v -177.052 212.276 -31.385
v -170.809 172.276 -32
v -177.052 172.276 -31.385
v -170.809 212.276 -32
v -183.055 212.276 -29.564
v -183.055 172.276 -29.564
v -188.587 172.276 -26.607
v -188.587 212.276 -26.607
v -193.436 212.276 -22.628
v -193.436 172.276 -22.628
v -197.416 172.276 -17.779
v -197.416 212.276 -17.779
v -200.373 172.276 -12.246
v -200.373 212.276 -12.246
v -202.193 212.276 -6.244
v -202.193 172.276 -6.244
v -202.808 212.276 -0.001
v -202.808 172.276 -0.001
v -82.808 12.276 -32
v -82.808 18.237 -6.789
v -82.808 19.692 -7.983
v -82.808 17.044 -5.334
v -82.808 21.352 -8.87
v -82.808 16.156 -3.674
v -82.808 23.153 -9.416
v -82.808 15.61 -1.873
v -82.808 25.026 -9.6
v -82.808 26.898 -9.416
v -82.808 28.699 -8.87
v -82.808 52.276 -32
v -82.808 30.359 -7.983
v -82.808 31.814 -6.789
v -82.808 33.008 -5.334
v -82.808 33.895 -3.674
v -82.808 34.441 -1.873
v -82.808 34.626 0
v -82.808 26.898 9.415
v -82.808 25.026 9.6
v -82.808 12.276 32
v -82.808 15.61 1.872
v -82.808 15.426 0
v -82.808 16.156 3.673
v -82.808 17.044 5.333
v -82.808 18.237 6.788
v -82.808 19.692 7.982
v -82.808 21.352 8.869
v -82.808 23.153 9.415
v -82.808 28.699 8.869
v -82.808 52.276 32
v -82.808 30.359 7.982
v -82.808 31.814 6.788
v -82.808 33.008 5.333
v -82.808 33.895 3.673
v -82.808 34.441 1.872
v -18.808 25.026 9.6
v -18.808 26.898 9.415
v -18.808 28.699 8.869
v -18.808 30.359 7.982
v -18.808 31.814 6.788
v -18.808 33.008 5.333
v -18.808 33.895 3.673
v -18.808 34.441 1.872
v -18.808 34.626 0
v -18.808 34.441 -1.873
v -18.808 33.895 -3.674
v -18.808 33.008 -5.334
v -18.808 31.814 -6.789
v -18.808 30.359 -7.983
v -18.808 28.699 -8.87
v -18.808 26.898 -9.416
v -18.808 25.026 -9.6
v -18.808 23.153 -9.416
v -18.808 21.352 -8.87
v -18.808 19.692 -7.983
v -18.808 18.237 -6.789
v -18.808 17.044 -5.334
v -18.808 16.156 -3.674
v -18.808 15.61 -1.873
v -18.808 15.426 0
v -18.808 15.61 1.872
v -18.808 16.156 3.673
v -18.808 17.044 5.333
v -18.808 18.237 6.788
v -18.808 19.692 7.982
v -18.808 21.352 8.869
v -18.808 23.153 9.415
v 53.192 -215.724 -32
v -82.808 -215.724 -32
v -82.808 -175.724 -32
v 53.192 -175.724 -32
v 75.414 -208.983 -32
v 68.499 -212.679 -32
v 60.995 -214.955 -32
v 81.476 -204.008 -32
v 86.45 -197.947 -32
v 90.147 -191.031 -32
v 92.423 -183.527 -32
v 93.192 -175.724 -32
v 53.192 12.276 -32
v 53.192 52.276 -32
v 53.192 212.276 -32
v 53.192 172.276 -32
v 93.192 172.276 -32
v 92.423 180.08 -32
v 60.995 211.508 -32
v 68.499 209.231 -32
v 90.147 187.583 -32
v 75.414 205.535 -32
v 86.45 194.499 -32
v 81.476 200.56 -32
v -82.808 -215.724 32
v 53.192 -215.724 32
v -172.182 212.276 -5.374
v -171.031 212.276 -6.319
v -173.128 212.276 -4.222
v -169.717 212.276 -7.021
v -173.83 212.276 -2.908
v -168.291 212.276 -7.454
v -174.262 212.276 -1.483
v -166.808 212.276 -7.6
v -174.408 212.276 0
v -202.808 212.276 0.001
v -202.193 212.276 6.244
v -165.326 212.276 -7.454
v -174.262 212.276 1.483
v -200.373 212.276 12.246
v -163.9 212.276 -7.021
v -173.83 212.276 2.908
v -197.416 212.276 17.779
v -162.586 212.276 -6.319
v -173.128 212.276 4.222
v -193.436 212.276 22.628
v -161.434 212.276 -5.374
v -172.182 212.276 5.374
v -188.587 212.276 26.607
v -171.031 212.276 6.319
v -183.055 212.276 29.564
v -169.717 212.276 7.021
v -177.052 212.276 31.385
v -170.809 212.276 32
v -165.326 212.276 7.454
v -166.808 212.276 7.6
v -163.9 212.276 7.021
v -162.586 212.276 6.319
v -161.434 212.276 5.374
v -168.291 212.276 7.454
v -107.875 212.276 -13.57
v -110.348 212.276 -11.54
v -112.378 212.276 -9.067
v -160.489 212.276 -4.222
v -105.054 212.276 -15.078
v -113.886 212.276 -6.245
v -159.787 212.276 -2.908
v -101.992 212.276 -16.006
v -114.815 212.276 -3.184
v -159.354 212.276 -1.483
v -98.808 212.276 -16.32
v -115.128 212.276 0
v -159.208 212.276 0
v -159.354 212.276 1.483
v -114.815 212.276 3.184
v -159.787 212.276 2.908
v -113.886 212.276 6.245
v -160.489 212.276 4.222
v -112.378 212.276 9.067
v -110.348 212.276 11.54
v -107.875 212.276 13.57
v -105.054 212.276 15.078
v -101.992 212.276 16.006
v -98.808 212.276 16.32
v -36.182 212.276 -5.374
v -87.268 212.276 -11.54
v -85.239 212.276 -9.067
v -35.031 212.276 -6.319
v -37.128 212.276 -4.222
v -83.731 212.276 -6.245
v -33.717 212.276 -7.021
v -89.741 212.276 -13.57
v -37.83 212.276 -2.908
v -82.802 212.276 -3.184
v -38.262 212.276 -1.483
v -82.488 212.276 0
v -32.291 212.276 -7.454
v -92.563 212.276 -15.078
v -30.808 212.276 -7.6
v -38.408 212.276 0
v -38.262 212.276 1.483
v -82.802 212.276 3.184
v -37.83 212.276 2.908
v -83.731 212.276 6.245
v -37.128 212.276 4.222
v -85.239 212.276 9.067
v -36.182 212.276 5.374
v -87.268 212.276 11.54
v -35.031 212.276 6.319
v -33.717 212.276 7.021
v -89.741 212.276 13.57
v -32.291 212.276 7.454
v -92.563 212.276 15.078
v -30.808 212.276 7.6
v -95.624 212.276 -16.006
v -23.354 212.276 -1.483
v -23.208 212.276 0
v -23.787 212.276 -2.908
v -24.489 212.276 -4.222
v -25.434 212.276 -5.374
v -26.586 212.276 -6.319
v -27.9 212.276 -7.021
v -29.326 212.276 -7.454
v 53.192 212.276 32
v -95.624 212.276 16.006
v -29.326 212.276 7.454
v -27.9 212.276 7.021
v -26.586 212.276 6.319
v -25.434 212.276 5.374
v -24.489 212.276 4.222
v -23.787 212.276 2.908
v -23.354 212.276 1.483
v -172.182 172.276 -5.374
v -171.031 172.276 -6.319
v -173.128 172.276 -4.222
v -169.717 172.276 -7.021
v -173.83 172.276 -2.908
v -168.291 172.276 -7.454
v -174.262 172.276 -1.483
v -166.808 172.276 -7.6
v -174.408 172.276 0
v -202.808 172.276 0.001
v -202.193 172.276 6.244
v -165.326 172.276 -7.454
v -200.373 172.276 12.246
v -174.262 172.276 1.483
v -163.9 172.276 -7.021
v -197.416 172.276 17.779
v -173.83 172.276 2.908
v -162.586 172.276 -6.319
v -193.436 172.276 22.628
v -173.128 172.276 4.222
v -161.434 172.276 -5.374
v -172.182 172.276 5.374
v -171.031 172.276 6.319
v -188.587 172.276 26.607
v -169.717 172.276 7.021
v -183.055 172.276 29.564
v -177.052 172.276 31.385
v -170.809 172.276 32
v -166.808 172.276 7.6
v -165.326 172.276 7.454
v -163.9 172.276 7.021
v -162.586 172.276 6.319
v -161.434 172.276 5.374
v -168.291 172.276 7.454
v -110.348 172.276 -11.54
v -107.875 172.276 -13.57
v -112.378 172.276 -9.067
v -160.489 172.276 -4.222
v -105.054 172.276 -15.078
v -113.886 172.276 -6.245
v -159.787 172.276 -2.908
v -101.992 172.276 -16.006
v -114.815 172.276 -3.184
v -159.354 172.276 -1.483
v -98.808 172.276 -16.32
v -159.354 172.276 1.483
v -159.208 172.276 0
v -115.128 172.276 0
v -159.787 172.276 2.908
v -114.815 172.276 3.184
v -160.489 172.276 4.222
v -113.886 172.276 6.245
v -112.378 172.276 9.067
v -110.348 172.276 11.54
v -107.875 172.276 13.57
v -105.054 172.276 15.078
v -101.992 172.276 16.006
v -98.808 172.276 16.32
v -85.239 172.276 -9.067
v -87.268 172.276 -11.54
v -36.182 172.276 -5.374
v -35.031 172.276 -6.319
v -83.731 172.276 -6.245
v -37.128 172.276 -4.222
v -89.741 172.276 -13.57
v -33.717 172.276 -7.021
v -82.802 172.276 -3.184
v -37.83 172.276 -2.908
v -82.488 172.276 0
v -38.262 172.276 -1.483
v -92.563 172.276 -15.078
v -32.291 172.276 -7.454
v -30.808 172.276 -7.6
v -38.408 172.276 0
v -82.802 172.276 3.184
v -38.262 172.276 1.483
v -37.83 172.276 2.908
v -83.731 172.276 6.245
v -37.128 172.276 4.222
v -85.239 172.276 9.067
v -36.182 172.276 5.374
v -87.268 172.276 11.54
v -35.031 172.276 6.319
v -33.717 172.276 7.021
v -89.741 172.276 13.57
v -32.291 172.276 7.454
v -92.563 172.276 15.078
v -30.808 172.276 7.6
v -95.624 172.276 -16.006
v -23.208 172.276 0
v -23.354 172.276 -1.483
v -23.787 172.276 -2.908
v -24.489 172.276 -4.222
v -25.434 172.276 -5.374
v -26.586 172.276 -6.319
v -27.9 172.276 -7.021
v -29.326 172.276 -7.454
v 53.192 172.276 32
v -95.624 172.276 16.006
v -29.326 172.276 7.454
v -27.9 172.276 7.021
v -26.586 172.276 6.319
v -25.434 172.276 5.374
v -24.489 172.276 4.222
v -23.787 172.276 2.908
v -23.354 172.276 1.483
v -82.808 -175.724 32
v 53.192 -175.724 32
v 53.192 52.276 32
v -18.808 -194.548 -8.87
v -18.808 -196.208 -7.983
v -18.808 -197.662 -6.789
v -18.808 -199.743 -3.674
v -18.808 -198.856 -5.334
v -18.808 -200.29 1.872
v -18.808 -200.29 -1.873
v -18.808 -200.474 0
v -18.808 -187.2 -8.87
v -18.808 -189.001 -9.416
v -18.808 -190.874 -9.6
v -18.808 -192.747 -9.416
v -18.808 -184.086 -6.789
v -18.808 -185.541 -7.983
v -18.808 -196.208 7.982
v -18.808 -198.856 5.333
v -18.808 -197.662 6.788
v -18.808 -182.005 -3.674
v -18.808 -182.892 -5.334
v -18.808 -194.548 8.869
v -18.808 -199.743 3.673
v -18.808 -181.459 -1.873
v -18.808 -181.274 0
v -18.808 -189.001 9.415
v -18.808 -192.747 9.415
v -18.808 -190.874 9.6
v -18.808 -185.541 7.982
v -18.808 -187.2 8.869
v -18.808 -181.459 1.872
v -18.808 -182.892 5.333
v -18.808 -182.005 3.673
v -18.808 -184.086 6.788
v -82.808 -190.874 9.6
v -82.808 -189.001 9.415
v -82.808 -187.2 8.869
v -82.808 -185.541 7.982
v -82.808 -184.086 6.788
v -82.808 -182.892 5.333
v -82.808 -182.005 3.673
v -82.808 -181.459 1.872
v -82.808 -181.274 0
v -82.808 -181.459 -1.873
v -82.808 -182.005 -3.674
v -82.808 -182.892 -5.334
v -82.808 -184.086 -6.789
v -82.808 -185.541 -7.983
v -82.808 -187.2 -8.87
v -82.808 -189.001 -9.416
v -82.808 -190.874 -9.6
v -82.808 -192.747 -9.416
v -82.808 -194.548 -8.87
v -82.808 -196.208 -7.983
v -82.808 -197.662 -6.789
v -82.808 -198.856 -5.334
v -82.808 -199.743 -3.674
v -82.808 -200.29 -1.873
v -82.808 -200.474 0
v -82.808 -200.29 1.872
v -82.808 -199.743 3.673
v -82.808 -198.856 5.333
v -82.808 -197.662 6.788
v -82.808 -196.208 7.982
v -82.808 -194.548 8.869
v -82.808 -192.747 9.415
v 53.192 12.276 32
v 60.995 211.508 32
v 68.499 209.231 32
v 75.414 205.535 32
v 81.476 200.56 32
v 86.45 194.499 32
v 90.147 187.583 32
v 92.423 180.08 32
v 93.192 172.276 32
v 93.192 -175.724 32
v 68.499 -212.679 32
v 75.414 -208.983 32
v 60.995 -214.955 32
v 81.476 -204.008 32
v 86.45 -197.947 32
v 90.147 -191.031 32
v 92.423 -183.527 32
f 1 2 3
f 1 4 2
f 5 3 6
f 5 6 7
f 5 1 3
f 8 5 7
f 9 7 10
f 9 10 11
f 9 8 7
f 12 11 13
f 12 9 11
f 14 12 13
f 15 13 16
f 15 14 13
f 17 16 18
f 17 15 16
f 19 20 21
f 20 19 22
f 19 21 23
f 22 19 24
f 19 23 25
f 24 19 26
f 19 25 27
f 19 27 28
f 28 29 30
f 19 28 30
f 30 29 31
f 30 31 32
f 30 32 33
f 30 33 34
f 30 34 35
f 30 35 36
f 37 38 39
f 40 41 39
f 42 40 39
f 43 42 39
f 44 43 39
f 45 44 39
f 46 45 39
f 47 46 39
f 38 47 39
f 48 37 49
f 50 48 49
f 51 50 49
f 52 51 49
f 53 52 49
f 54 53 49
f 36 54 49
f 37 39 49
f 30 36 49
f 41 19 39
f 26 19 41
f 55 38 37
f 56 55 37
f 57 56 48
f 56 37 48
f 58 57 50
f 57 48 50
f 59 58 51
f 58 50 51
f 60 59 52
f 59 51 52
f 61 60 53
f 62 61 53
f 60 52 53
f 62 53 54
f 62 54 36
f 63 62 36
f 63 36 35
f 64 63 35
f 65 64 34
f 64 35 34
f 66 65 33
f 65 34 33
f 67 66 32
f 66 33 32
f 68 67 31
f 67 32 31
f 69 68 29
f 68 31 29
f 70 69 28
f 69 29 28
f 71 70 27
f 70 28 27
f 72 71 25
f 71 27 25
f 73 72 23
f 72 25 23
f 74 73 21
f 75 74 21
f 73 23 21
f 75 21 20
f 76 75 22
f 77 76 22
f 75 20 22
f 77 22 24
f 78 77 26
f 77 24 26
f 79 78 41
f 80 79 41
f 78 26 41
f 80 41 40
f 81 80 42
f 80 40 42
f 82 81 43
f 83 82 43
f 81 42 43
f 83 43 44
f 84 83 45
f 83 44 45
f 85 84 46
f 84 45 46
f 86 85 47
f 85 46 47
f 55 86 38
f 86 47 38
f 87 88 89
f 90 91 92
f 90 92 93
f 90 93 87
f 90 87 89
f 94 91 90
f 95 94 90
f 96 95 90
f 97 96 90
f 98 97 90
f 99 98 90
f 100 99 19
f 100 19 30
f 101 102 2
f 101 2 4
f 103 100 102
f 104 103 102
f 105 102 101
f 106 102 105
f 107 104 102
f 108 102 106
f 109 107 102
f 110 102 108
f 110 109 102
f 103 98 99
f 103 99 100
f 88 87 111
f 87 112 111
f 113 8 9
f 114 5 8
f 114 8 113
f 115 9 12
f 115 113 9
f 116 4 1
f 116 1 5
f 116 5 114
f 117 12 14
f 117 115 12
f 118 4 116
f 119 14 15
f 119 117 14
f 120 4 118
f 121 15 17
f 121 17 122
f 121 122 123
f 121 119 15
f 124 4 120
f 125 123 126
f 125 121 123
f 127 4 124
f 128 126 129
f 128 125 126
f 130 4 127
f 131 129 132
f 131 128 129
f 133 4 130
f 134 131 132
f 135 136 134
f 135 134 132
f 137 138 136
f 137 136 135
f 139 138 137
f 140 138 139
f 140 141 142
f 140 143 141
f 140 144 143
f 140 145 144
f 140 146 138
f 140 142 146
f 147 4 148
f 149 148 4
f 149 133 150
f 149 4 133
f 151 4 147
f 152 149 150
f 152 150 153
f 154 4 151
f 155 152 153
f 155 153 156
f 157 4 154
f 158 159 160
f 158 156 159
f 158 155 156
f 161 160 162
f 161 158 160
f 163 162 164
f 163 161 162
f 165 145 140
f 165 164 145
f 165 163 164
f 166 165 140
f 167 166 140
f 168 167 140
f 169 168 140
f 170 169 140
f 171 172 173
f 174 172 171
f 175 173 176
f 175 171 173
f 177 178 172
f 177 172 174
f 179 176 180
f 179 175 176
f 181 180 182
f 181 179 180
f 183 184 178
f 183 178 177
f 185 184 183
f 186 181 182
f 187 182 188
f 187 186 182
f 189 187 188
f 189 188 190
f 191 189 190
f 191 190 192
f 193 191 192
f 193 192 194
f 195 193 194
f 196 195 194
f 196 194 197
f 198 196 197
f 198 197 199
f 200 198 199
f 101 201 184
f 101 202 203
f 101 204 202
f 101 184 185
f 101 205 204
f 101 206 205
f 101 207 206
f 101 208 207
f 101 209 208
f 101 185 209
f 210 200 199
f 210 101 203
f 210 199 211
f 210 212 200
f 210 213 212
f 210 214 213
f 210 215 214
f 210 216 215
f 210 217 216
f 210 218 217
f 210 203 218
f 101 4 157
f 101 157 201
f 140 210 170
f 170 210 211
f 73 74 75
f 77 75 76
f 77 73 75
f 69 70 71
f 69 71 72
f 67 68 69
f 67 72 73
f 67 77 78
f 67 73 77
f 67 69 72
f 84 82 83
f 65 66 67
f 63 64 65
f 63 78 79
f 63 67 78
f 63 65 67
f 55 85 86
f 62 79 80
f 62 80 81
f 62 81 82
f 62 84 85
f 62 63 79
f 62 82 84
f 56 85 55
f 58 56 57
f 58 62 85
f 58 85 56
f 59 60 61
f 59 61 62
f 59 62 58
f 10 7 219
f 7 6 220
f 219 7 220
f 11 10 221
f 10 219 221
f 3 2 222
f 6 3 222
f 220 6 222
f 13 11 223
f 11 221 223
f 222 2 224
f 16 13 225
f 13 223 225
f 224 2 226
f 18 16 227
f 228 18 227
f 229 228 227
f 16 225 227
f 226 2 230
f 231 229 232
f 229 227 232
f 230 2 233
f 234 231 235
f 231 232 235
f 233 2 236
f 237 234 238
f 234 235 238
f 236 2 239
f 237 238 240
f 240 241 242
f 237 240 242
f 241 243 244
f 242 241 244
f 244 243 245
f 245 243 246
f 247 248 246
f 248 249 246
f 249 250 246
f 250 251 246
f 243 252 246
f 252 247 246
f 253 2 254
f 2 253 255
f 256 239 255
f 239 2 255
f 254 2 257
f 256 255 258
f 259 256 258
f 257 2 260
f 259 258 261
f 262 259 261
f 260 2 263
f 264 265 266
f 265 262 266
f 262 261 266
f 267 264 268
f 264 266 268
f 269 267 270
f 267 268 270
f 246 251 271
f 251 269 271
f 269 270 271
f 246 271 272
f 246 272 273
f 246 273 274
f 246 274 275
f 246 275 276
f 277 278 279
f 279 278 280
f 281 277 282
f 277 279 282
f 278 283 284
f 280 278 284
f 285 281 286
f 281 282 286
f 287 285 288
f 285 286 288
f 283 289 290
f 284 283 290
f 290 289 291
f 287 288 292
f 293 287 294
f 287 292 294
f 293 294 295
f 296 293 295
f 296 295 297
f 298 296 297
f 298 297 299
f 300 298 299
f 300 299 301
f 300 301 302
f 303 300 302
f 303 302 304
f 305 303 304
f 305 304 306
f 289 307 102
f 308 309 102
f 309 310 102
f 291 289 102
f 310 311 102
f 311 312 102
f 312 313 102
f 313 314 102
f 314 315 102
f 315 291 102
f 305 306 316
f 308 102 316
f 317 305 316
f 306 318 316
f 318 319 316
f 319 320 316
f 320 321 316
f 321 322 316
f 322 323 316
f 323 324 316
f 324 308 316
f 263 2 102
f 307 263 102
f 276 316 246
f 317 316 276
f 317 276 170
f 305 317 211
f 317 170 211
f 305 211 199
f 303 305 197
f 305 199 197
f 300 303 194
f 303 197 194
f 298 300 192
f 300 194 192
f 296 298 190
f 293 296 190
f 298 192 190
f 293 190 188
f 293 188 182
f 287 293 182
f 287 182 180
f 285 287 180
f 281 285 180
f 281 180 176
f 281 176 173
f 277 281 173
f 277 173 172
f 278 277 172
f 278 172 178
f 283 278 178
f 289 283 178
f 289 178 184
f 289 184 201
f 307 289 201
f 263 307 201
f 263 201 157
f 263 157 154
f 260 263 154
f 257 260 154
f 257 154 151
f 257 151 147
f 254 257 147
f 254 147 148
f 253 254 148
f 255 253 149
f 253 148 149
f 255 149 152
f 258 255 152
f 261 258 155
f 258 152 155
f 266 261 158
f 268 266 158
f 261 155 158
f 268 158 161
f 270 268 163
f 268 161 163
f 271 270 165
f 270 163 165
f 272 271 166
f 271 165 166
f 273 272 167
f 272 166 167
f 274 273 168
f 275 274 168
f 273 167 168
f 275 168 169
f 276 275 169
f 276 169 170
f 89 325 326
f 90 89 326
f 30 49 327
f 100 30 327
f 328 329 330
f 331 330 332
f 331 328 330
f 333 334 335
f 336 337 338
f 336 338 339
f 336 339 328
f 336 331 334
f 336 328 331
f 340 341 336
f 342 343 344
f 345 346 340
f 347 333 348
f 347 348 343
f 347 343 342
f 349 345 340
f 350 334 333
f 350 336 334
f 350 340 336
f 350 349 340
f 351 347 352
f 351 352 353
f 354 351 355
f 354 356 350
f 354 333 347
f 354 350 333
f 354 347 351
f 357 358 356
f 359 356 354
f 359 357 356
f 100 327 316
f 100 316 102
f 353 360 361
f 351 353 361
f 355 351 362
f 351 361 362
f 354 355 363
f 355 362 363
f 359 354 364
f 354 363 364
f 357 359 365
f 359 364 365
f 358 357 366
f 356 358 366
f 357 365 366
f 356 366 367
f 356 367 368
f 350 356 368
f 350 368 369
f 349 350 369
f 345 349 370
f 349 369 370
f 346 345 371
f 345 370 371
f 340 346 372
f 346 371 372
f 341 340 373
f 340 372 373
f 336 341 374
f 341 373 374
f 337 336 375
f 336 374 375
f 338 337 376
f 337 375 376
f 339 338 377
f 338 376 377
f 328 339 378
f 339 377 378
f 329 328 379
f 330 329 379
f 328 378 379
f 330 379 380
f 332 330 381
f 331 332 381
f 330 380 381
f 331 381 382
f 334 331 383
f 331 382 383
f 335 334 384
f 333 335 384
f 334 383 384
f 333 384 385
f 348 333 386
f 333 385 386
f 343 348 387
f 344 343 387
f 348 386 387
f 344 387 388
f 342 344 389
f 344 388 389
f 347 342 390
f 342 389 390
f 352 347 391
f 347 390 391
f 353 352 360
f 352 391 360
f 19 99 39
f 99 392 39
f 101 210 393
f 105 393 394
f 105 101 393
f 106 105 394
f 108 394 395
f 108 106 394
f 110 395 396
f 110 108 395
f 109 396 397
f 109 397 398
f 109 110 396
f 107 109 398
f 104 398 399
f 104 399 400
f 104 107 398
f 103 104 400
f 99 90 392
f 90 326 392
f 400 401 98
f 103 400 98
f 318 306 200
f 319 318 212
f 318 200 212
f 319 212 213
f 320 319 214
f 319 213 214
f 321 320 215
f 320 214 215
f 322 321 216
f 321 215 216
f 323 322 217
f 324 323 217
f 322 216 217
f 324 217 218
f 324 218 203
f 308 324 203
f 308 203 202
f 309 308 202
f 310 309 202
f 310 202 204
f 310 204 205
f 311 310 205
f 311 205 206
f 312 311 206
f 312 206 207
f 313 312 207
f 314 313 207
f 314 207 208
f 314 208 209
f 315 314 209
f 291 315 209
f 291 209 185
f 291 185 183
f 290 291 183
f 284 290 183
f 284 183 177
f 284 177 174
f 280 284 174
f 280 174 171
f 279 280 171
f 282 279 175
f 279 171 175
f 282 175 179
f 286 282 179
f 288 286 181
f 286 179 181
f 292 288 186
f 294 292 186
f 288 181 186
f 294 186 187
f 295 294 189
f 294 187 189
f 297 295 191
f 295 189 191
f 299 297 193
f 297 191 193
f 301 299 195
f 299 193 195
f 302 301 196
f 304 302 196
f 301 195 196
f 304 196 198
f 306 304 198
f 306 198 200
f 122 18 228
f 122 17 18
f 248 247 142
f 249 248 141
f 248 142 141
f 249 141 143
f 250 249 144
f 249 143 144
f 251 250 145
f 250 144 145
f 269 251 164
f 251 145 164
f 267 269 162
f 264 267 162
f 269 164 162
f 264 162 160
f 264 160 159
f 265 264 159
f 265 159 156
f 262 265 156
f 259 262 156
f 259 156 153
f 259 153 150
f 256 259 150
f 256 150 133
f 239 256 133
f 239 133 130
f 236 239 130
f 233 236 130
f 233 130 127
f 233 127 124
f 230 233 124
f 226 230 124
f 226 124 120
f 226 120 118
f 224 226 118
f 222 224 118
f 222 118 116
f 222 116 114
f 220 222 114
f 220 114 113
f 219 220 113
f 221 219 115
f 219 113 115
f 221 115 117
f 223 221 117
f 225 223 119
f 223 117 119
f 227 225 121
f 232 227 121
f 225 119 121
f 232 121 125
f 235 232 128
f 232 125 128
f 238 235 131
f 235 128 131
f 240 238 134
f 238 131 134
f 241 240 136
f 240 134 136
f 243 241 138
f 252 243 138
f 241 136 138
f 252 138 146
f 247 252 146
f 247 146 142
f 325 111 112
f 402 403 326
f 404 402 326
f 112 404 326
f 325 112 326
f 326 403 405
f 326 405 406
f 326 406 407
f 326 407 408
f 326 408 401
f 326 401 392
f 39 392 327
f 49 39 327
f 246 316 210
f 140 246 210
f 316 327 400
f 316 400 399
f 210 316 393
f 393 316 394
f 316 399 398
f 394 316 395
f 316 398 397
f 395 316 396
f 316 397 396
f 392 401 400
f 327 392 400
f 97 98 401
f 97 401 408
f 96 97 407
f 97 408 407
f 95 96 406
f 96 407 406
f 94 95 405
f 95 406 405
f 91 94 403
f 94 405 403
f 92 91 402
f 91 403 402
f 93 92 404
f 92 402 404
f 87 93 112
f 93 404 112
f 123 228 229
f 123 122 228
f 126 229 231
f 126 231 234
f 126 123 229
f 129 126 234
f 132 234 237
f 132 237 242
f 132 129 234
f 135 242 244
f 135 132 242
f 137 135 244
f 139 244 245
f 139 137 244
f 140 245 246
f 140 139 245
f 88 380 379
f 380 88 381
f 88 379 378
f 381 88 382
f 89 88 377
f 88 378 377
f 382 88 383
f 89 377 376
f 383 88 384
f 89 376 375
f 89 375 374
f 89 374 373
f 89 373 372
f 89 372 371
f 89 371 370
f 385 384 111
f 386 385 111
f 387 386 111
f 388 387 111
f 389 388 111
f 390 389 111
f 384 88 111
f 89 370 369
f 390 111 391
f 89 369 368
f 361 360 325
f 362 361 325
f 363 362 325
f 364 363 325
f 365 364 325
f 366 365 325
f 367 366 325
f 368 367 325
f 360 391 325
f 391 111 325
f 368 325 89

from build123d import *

# Parameters (mm, degrees)
P_IDAT_VYSUNUT_M1_DEPTH  = 4
SKICA2_W                 = 5
SKICA2_H                 = 8
P_IDAT_VYSUNUT_M2_DEPTH  = 20
SKICA3_W                 = 8
SKICA3_H                 = 5
P_IDAT_VYSUNUT_M3_DEPTH  = 32
SKICA5_R                 = 2.04
ODEBRAT_VYSUNUT_M1_DEPTH = 15
ZAOBLIT1_R               = 5
SKICA6_R                 = 1.2
ODEBRAT_VYSUNUT_M2_DEPTH = 8
ZAOBLIT2_R               = 4
SKICA7_R                 = 0.95
ODEBRAT_VYSUNUT_M3_DEPTH = 13
SCALE1_SCALE             = 8


with BuildPart() as part:
    # Skica1 → Přidat vysunutím1 (new, symmetric)
    with BuildSketch(Plane.XY):
        Polygon((0, 0), (17, 0), (17, 23.5), (0, 23.5), (0, 28.5), (22, 28.5), (22, -5), (0, -5), align=None)
    extrude(amount=P_IDAT_VYSUNUT_M1_DEPTH, both=True)

    # Skica2 → Přidat vysunutím2 (add)
    with BuildSketch(Plane(origin=(0, 28.5, 0), x_dir=(1, 0, 0), z_dir=(0, 1, 0))):
        with Locations((19.5, 0)):
            Rectangle(SKICA2_W, SKICA2_H)
    extrude(amount=P_IDAT_VYSUNUT_M2_DEPTH)

    # Skica3 → Přidat vysunutím3 (add)
    with BuildSketch(Plane.ZY.offset(-17)):
        with Locations((0, 46)):
            Rectangle(SKICA3_W, SKICA3_H)
    extrude(amount=P_IDAT_VYSUNUT_M3_DEPTH)

    # Skica5 → Odebrat vysunutím1 (cut)
    with BuildSketch(Plane(origin=(0, 48.5, 0), x_dir=(1, 0, 0), z_dir=(0, 1, 0))):
        with Locations(Location((-2, 0, 0), (0, 0, 270))):
            Circle(SKICA5_R)
    extrude(amount=-ODEBRAT_VYSUNUT_M1_DEPTH, mode=Mode.SUBTRACT)

    # Zaoblit1
    zaoblit1_edges = [part.edges().sort_by_distance(p)[0] for p in [
        (22, -5, 0),
        (22, 48.5, 0),
    ]]
    fillet(zaoblit1_edges, radius=ZAOBLIT1_R)

    # Skica6 → Odebrat vysunutím2 (cut)
    with BuildSketch(Plane.ZY):
        with Locations((-6.1415e-05, 25.09368658)):
            Circle(SKICA6_R)
        with Locations((-5.8558e-05, -1.893787552)):
            Circle(SKICA6_R)
    extrude(amount=-ODEBRAT_VYSUNUT_M2_DEPTH, mode=Mode.SUBTRACT)

    # Zaoblit2
    zaoblit2_edges = [part.edges().sort_by_distance(p)[0] for p in [
        (-15, 46, -4),
        (-15, 46, 4),
    ]]
    fillet(zaoblit2_edges, radius=ZAOBLIT2_R - 0.0001)  # a hair under: the kernel refuses the full size

    # Skica7 → Odebrat vysunutím3 (cut)
    with BuildSketch(Plane(origin=(0, 48.5, 0), x_dir=(1, 0, 0), z_dir=(0, 1, 0))):
        with Locations(Location((-10.5, 0, 0), (0, 0, 270))):
            Circle(SKICA7_R)
        with Locations(Location((6.5, 0, 0), (0, 0, 270))):
            Circle(SKICA7_R)
    extrude(amount=-ODEBRAT_VYSUNUT_M3_DEPTH, mode=Mode.SUBTRACT)


with BuildPart() as part_1:
    # Scale1: scaled about (11.829762973, 25.103410302, 9.66e-07)
    add(part.part.scale(SCALE1_SCALE).moved(Location((-82.808340811, -175.723872114, -6.762e-06))))


solid = part_1.part
